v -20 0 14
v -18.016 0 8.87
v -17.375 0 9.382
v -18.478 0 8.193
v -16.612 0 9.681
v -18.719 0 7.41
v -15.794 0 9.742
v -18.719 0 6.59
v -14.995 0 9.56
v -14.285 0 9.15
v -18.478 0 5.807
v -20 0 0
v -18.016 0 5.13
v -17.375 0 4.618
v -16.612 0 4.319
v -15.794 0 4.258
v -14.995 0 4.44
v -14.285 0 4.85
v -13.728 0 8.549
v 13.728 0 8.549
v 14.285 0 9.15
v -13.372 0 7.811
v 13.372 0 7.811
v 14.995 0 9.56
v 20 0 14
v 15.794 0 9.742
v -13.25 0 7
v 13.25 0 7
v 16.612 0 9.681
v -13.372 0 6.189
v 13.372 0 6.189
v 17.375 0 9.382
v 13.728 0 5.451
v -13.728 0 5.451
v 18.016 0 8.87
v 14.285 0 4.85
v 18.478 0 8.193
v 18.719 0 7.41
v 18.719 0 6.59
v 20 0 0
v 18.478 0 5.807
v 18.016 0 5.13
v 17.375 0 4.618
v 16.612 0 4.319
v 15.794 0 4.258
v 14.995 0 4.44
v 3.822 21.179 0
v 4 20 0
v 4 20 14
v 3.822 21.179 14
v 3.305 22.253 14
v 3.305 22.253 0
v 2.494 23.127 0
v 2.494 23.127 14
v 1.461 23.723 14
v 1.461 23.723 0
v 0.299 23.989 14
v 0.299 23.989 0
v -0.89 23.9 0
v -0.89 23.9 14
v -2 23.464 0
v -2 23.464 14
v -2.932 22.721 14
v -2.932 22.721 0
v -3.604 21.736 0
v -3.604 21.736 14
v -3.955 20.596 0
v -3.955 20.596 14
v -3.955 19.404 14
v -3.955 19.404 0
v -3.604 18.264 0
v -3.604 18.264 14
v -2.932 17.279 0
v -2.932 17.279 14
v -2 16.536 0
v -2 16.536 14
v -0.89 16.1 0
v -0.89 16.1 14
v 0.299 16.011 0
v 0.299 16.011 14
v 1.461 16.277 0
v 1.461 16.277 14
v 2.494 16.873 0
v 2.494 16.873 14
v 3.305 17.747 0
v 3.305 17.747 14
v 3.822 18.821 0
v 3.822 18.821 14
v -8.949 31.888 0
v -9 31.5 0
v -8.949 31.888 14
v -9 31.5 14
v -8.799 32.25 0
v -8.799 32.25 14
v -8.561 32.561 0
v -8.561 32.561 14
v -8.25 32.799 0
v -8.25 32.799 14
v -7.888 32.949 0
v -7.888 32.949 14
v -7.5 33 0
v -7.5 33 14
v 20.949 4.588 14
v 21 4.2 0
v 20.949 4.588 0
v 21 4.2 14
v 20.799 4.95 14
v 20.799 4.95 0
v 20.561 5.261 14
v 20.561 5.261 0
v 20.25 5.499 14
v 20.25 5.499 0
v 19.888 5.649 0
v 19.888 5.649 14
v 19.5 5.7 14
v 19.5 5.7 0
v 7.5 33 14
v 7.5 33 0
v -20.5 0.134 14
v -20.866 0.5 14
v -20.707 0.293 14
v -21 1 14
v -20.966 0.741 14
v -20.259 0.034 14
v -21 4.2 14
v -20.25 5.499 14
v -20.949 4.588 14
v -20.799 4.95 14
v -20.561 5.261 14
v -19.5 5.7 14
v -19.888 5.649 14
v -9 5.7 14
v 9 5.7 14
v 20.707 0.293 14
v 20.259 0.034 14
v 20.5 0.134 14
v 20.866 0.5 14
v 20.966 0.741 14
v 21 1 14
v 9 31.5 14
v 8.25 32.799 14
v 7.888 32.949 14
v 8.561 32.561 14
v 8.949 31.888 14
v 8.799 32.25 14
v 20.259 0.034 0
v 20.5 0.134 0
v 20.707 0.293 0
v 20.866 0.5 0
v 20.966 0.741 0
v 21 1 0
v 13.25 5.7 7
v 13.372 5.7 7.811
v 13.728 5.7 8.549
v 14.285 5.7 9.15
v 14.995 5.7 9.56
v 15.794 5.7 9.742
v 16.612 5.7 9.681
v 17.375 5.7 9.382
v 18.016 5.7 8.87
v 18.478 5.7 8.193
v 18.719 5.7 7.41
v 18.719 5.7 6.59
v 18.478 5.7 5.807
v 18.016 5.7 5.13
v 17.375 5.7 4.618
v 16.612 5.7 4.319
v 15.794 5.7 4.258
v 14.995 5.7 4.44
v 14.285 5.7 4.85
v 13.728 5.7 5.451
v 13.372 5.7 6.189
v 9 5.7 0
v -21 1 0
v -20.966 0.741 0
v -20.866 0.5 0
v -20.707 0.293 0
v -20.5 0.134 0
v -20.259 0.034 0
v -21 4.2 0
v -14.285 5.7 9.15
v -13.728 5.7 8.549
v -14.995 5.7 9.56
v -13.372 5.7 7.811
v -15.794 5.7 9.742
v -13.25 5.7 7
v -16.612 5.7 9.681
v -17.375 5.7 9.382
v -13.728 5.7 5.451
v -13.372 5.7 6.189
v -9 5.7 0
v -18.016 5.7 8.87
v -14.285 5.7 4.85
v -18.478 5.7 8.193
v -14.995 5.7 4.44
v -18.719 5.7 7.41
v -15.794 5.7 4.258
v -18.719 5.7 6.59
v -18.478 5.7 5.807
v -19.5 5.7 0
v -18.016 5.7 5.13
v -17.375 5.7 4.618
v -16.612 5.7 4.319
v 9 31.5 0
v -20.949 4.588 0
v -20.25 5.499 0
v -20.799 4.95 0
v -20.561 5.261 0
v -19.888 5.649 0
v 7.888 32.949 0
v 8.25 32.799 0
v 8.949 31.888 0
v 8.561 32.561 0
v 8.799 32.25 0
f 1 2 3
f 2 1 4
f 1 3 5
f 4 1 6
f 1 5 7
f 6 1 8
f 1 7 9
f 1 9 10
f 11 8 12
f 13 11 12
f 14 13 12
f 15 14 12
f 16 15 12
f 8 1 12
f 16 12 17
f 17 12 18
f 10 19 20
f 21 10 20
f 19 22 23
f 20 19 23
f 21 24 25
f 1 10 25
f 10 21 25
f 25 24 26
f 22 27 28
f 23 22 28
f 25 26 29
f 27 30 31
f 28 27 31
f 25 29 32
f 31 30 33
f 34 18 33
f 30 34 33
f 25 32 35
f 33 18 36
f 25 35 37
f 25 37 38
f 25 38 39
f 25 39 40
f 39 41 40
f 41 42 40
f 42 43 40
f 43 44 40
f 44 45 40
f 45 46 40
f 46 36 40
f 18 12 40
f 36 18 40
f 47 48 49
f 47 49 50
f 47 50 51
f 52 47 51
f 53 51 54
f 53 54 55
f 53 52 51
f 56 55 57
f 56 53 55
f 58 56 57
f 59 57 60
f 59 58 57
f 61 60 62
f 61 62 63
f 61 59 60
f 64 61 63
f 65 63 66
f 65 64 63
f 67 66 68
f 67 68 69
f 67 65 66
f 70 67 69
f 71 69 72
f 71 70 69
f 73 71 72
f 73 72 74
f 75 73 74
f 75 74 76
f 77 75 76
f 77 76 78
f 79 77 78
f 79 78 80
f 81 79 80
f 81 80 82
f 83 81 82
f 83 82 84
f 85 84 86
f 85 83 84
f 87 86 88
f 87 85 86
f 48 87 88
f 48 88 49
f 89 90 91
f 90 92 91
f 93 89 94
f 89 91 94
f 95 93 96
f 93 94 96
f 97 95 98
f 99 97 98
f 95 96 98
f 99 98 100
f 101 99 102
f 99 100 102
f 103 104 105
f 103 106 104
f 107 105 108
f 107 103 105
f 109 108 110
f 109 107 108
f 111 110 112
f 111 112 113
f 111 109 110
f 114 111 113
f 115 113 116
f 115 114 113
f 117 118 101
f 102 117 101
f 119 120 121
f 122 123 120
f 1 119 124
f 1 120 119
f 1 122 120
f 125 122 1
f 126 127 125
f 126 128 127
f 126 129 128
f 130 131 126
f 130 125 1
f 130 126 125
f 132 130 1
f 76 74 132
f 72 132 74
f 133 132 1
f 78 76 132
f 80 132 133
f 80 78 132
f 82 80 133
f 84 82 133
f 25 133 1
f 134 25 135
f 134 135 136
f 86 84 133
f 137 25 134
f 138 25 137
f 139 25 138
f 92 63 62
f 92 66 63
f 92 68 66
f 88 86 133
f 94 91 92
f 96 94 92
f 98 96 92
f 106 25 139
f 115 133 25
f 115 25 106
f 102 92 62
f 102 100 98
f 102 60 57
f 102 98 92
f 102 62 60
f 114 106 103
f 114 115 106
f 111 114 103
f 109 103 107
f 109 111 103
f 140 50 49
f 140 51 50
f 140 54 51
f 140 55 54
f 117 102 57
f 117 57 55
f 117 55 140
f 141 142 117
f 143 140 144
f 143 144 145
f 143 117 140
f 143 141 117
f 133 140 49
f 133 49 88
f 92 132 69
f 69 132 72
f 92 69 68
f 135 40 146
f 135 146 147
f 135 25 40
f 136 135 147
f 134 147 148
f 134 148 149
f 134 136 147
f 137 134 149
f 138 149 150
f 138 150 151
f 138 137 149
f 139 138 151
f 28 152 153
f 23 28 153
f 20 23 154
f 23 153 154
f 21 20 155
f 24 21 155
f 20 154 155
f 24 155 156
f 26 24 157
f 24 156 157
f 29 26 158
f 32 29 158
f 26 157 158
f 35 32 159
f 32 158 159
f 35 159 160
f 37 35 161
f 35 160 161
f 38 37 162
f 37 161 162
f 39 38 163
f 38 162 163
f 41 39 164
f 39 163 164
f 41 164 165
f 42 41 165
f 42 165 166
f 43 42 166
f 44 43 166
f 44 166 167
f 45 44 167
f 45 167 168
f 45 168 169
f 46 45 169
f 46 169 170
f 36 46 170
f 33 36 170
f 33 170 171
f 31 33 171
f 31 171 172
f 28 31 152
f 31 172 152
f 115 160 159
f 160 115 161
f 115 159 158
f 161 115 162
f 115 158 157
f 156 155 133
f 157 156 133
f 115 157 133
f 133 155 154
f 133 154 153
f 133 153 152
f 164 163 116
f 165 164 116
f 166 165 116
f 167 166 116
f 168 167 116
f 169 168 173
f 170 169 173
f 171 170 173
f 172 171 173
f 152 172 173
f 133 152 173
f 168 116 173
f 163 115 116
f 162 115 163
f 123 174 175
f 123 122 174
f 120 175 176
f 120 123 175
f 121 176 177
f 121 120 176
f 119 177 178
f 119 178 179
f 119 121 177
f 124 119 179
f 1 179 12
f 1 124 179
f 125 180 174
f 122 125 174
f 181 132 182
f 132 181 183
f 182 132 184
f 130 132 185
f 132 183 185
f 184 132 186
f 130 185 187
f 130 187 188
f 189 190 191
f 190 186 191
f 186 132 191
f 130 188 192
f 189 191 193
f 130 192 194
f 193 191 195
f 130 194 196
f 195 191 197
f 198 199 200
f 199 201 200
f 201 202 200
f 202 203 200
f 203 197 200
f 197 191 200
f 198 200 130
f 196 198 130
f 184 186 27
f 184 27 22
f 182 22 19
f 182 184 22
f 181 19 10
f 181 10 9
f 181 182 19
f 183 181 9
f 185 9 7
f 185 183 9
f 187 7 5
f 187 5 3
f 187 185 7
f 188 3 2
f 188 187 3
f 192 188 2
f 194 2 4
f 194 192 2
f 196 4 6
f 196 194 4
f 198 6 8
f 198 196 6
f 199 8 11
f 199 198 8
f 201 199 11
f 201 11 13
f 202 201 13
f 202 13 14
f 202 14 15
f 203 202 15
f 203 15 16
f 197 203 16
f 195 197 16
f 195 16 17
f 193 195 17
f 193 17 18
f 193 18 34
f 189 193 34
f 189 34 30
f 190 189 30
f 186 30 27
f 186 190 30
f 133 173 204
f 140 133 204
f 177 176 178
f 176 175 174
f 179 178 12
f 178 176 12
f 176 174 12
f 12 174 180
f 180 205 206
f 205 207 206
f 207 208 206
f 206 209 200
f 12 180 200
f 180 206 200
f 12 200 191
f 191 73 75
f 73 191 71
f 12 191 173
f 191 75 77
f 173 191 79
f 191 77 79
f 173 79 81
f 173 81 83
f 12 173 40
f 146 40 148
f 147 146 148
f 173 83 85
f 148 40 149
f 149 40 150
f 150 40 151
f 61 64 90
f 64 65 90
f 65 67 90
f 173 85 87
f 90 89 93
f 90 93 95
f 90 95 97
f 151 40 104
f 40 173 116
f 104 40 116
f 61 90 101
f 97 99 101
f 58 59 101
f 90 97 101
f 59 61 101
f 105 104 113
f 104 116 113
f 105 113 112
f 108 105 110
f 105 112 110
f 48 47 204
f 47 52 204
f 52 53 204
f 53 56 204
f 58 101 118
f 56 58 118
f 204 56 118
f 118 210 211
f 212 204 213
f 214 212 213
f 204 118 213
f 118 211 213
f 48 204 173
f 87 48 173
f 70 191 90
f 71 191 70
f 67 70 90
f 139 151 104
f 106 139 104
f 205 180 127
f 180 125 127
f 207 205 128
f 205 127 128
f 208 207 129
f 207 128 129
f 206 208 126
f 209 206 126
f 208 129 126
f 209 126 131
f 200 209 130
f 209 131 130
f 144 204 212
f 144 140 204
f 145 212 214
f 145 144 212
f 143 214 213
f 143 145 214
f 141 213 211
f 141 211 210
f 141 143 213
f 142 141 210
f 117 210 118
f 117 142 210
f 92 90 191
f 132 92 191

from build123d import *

# Parameters (mm, degrees)
SKETCH_R     = 4
PAD_DEPTH    = 14
SKETCH001_R  = 2.75
POCKET_DEPTH = 5.7
FILLET_R     = 1.5
FILLET001_R  = 1


with BuildPart() as part:
    # Sketch → Pad (new body)
    with BuildSketch(Plane.XY):
        Polygon((-21, 0), (21, 0), (21, 5.7), (9, 5.7), (9, 33), (-9, 33), (-9, 5.7), (-21, 5.7), align=None)
        with Locations((0, 20)):
            Circle(SKETCH_R, mode=Mode.SUBTRACT)
    extrude(amount=PAD_DEPTH)

    # Sketch001 (on Face3 of Pad) → Pocket (cut)
    with BuildSketch(Plane(origin=(0, 5.7, 0), x_dir=(-1, 0, 0), z_dir=(0, 1, 0))):
        with Locations((-16, 7)):
            Circle(SKETCH001_R)
    pocket = extrude(amount=-POCKET_DEPTH, mode=Mode.SUBTRACT)

    # Mirrored: Pocket across Sketch001 V_Axis
    add(pocket.mirror(Plane(origin=(0, 5.7, 0), x_dir=(0, 1, 0), z_dir=(-1, 0, 0))), mode=Mode.SUBTRACT)

    # Fillet
    fillet_edges = [part.edges().sort_by_distance(p)[0] for p in [
        (21, 5.7, 7),
        (-21, 5.7, 7),
        (-9, 33, 7),
        (9, 33, 7),
    ]]
    fillet(fillet_edges, radius=FILLET_R)

    # Fillet001
    fillet001_edges = [part.edges().sort_by_distance(p)[0] for p in [
        (21, 0, 7),
        (-21, 0, 7),
    ]]
    fillet(fillet001_edges, radius=FILLET001_R)


solid = part.part
